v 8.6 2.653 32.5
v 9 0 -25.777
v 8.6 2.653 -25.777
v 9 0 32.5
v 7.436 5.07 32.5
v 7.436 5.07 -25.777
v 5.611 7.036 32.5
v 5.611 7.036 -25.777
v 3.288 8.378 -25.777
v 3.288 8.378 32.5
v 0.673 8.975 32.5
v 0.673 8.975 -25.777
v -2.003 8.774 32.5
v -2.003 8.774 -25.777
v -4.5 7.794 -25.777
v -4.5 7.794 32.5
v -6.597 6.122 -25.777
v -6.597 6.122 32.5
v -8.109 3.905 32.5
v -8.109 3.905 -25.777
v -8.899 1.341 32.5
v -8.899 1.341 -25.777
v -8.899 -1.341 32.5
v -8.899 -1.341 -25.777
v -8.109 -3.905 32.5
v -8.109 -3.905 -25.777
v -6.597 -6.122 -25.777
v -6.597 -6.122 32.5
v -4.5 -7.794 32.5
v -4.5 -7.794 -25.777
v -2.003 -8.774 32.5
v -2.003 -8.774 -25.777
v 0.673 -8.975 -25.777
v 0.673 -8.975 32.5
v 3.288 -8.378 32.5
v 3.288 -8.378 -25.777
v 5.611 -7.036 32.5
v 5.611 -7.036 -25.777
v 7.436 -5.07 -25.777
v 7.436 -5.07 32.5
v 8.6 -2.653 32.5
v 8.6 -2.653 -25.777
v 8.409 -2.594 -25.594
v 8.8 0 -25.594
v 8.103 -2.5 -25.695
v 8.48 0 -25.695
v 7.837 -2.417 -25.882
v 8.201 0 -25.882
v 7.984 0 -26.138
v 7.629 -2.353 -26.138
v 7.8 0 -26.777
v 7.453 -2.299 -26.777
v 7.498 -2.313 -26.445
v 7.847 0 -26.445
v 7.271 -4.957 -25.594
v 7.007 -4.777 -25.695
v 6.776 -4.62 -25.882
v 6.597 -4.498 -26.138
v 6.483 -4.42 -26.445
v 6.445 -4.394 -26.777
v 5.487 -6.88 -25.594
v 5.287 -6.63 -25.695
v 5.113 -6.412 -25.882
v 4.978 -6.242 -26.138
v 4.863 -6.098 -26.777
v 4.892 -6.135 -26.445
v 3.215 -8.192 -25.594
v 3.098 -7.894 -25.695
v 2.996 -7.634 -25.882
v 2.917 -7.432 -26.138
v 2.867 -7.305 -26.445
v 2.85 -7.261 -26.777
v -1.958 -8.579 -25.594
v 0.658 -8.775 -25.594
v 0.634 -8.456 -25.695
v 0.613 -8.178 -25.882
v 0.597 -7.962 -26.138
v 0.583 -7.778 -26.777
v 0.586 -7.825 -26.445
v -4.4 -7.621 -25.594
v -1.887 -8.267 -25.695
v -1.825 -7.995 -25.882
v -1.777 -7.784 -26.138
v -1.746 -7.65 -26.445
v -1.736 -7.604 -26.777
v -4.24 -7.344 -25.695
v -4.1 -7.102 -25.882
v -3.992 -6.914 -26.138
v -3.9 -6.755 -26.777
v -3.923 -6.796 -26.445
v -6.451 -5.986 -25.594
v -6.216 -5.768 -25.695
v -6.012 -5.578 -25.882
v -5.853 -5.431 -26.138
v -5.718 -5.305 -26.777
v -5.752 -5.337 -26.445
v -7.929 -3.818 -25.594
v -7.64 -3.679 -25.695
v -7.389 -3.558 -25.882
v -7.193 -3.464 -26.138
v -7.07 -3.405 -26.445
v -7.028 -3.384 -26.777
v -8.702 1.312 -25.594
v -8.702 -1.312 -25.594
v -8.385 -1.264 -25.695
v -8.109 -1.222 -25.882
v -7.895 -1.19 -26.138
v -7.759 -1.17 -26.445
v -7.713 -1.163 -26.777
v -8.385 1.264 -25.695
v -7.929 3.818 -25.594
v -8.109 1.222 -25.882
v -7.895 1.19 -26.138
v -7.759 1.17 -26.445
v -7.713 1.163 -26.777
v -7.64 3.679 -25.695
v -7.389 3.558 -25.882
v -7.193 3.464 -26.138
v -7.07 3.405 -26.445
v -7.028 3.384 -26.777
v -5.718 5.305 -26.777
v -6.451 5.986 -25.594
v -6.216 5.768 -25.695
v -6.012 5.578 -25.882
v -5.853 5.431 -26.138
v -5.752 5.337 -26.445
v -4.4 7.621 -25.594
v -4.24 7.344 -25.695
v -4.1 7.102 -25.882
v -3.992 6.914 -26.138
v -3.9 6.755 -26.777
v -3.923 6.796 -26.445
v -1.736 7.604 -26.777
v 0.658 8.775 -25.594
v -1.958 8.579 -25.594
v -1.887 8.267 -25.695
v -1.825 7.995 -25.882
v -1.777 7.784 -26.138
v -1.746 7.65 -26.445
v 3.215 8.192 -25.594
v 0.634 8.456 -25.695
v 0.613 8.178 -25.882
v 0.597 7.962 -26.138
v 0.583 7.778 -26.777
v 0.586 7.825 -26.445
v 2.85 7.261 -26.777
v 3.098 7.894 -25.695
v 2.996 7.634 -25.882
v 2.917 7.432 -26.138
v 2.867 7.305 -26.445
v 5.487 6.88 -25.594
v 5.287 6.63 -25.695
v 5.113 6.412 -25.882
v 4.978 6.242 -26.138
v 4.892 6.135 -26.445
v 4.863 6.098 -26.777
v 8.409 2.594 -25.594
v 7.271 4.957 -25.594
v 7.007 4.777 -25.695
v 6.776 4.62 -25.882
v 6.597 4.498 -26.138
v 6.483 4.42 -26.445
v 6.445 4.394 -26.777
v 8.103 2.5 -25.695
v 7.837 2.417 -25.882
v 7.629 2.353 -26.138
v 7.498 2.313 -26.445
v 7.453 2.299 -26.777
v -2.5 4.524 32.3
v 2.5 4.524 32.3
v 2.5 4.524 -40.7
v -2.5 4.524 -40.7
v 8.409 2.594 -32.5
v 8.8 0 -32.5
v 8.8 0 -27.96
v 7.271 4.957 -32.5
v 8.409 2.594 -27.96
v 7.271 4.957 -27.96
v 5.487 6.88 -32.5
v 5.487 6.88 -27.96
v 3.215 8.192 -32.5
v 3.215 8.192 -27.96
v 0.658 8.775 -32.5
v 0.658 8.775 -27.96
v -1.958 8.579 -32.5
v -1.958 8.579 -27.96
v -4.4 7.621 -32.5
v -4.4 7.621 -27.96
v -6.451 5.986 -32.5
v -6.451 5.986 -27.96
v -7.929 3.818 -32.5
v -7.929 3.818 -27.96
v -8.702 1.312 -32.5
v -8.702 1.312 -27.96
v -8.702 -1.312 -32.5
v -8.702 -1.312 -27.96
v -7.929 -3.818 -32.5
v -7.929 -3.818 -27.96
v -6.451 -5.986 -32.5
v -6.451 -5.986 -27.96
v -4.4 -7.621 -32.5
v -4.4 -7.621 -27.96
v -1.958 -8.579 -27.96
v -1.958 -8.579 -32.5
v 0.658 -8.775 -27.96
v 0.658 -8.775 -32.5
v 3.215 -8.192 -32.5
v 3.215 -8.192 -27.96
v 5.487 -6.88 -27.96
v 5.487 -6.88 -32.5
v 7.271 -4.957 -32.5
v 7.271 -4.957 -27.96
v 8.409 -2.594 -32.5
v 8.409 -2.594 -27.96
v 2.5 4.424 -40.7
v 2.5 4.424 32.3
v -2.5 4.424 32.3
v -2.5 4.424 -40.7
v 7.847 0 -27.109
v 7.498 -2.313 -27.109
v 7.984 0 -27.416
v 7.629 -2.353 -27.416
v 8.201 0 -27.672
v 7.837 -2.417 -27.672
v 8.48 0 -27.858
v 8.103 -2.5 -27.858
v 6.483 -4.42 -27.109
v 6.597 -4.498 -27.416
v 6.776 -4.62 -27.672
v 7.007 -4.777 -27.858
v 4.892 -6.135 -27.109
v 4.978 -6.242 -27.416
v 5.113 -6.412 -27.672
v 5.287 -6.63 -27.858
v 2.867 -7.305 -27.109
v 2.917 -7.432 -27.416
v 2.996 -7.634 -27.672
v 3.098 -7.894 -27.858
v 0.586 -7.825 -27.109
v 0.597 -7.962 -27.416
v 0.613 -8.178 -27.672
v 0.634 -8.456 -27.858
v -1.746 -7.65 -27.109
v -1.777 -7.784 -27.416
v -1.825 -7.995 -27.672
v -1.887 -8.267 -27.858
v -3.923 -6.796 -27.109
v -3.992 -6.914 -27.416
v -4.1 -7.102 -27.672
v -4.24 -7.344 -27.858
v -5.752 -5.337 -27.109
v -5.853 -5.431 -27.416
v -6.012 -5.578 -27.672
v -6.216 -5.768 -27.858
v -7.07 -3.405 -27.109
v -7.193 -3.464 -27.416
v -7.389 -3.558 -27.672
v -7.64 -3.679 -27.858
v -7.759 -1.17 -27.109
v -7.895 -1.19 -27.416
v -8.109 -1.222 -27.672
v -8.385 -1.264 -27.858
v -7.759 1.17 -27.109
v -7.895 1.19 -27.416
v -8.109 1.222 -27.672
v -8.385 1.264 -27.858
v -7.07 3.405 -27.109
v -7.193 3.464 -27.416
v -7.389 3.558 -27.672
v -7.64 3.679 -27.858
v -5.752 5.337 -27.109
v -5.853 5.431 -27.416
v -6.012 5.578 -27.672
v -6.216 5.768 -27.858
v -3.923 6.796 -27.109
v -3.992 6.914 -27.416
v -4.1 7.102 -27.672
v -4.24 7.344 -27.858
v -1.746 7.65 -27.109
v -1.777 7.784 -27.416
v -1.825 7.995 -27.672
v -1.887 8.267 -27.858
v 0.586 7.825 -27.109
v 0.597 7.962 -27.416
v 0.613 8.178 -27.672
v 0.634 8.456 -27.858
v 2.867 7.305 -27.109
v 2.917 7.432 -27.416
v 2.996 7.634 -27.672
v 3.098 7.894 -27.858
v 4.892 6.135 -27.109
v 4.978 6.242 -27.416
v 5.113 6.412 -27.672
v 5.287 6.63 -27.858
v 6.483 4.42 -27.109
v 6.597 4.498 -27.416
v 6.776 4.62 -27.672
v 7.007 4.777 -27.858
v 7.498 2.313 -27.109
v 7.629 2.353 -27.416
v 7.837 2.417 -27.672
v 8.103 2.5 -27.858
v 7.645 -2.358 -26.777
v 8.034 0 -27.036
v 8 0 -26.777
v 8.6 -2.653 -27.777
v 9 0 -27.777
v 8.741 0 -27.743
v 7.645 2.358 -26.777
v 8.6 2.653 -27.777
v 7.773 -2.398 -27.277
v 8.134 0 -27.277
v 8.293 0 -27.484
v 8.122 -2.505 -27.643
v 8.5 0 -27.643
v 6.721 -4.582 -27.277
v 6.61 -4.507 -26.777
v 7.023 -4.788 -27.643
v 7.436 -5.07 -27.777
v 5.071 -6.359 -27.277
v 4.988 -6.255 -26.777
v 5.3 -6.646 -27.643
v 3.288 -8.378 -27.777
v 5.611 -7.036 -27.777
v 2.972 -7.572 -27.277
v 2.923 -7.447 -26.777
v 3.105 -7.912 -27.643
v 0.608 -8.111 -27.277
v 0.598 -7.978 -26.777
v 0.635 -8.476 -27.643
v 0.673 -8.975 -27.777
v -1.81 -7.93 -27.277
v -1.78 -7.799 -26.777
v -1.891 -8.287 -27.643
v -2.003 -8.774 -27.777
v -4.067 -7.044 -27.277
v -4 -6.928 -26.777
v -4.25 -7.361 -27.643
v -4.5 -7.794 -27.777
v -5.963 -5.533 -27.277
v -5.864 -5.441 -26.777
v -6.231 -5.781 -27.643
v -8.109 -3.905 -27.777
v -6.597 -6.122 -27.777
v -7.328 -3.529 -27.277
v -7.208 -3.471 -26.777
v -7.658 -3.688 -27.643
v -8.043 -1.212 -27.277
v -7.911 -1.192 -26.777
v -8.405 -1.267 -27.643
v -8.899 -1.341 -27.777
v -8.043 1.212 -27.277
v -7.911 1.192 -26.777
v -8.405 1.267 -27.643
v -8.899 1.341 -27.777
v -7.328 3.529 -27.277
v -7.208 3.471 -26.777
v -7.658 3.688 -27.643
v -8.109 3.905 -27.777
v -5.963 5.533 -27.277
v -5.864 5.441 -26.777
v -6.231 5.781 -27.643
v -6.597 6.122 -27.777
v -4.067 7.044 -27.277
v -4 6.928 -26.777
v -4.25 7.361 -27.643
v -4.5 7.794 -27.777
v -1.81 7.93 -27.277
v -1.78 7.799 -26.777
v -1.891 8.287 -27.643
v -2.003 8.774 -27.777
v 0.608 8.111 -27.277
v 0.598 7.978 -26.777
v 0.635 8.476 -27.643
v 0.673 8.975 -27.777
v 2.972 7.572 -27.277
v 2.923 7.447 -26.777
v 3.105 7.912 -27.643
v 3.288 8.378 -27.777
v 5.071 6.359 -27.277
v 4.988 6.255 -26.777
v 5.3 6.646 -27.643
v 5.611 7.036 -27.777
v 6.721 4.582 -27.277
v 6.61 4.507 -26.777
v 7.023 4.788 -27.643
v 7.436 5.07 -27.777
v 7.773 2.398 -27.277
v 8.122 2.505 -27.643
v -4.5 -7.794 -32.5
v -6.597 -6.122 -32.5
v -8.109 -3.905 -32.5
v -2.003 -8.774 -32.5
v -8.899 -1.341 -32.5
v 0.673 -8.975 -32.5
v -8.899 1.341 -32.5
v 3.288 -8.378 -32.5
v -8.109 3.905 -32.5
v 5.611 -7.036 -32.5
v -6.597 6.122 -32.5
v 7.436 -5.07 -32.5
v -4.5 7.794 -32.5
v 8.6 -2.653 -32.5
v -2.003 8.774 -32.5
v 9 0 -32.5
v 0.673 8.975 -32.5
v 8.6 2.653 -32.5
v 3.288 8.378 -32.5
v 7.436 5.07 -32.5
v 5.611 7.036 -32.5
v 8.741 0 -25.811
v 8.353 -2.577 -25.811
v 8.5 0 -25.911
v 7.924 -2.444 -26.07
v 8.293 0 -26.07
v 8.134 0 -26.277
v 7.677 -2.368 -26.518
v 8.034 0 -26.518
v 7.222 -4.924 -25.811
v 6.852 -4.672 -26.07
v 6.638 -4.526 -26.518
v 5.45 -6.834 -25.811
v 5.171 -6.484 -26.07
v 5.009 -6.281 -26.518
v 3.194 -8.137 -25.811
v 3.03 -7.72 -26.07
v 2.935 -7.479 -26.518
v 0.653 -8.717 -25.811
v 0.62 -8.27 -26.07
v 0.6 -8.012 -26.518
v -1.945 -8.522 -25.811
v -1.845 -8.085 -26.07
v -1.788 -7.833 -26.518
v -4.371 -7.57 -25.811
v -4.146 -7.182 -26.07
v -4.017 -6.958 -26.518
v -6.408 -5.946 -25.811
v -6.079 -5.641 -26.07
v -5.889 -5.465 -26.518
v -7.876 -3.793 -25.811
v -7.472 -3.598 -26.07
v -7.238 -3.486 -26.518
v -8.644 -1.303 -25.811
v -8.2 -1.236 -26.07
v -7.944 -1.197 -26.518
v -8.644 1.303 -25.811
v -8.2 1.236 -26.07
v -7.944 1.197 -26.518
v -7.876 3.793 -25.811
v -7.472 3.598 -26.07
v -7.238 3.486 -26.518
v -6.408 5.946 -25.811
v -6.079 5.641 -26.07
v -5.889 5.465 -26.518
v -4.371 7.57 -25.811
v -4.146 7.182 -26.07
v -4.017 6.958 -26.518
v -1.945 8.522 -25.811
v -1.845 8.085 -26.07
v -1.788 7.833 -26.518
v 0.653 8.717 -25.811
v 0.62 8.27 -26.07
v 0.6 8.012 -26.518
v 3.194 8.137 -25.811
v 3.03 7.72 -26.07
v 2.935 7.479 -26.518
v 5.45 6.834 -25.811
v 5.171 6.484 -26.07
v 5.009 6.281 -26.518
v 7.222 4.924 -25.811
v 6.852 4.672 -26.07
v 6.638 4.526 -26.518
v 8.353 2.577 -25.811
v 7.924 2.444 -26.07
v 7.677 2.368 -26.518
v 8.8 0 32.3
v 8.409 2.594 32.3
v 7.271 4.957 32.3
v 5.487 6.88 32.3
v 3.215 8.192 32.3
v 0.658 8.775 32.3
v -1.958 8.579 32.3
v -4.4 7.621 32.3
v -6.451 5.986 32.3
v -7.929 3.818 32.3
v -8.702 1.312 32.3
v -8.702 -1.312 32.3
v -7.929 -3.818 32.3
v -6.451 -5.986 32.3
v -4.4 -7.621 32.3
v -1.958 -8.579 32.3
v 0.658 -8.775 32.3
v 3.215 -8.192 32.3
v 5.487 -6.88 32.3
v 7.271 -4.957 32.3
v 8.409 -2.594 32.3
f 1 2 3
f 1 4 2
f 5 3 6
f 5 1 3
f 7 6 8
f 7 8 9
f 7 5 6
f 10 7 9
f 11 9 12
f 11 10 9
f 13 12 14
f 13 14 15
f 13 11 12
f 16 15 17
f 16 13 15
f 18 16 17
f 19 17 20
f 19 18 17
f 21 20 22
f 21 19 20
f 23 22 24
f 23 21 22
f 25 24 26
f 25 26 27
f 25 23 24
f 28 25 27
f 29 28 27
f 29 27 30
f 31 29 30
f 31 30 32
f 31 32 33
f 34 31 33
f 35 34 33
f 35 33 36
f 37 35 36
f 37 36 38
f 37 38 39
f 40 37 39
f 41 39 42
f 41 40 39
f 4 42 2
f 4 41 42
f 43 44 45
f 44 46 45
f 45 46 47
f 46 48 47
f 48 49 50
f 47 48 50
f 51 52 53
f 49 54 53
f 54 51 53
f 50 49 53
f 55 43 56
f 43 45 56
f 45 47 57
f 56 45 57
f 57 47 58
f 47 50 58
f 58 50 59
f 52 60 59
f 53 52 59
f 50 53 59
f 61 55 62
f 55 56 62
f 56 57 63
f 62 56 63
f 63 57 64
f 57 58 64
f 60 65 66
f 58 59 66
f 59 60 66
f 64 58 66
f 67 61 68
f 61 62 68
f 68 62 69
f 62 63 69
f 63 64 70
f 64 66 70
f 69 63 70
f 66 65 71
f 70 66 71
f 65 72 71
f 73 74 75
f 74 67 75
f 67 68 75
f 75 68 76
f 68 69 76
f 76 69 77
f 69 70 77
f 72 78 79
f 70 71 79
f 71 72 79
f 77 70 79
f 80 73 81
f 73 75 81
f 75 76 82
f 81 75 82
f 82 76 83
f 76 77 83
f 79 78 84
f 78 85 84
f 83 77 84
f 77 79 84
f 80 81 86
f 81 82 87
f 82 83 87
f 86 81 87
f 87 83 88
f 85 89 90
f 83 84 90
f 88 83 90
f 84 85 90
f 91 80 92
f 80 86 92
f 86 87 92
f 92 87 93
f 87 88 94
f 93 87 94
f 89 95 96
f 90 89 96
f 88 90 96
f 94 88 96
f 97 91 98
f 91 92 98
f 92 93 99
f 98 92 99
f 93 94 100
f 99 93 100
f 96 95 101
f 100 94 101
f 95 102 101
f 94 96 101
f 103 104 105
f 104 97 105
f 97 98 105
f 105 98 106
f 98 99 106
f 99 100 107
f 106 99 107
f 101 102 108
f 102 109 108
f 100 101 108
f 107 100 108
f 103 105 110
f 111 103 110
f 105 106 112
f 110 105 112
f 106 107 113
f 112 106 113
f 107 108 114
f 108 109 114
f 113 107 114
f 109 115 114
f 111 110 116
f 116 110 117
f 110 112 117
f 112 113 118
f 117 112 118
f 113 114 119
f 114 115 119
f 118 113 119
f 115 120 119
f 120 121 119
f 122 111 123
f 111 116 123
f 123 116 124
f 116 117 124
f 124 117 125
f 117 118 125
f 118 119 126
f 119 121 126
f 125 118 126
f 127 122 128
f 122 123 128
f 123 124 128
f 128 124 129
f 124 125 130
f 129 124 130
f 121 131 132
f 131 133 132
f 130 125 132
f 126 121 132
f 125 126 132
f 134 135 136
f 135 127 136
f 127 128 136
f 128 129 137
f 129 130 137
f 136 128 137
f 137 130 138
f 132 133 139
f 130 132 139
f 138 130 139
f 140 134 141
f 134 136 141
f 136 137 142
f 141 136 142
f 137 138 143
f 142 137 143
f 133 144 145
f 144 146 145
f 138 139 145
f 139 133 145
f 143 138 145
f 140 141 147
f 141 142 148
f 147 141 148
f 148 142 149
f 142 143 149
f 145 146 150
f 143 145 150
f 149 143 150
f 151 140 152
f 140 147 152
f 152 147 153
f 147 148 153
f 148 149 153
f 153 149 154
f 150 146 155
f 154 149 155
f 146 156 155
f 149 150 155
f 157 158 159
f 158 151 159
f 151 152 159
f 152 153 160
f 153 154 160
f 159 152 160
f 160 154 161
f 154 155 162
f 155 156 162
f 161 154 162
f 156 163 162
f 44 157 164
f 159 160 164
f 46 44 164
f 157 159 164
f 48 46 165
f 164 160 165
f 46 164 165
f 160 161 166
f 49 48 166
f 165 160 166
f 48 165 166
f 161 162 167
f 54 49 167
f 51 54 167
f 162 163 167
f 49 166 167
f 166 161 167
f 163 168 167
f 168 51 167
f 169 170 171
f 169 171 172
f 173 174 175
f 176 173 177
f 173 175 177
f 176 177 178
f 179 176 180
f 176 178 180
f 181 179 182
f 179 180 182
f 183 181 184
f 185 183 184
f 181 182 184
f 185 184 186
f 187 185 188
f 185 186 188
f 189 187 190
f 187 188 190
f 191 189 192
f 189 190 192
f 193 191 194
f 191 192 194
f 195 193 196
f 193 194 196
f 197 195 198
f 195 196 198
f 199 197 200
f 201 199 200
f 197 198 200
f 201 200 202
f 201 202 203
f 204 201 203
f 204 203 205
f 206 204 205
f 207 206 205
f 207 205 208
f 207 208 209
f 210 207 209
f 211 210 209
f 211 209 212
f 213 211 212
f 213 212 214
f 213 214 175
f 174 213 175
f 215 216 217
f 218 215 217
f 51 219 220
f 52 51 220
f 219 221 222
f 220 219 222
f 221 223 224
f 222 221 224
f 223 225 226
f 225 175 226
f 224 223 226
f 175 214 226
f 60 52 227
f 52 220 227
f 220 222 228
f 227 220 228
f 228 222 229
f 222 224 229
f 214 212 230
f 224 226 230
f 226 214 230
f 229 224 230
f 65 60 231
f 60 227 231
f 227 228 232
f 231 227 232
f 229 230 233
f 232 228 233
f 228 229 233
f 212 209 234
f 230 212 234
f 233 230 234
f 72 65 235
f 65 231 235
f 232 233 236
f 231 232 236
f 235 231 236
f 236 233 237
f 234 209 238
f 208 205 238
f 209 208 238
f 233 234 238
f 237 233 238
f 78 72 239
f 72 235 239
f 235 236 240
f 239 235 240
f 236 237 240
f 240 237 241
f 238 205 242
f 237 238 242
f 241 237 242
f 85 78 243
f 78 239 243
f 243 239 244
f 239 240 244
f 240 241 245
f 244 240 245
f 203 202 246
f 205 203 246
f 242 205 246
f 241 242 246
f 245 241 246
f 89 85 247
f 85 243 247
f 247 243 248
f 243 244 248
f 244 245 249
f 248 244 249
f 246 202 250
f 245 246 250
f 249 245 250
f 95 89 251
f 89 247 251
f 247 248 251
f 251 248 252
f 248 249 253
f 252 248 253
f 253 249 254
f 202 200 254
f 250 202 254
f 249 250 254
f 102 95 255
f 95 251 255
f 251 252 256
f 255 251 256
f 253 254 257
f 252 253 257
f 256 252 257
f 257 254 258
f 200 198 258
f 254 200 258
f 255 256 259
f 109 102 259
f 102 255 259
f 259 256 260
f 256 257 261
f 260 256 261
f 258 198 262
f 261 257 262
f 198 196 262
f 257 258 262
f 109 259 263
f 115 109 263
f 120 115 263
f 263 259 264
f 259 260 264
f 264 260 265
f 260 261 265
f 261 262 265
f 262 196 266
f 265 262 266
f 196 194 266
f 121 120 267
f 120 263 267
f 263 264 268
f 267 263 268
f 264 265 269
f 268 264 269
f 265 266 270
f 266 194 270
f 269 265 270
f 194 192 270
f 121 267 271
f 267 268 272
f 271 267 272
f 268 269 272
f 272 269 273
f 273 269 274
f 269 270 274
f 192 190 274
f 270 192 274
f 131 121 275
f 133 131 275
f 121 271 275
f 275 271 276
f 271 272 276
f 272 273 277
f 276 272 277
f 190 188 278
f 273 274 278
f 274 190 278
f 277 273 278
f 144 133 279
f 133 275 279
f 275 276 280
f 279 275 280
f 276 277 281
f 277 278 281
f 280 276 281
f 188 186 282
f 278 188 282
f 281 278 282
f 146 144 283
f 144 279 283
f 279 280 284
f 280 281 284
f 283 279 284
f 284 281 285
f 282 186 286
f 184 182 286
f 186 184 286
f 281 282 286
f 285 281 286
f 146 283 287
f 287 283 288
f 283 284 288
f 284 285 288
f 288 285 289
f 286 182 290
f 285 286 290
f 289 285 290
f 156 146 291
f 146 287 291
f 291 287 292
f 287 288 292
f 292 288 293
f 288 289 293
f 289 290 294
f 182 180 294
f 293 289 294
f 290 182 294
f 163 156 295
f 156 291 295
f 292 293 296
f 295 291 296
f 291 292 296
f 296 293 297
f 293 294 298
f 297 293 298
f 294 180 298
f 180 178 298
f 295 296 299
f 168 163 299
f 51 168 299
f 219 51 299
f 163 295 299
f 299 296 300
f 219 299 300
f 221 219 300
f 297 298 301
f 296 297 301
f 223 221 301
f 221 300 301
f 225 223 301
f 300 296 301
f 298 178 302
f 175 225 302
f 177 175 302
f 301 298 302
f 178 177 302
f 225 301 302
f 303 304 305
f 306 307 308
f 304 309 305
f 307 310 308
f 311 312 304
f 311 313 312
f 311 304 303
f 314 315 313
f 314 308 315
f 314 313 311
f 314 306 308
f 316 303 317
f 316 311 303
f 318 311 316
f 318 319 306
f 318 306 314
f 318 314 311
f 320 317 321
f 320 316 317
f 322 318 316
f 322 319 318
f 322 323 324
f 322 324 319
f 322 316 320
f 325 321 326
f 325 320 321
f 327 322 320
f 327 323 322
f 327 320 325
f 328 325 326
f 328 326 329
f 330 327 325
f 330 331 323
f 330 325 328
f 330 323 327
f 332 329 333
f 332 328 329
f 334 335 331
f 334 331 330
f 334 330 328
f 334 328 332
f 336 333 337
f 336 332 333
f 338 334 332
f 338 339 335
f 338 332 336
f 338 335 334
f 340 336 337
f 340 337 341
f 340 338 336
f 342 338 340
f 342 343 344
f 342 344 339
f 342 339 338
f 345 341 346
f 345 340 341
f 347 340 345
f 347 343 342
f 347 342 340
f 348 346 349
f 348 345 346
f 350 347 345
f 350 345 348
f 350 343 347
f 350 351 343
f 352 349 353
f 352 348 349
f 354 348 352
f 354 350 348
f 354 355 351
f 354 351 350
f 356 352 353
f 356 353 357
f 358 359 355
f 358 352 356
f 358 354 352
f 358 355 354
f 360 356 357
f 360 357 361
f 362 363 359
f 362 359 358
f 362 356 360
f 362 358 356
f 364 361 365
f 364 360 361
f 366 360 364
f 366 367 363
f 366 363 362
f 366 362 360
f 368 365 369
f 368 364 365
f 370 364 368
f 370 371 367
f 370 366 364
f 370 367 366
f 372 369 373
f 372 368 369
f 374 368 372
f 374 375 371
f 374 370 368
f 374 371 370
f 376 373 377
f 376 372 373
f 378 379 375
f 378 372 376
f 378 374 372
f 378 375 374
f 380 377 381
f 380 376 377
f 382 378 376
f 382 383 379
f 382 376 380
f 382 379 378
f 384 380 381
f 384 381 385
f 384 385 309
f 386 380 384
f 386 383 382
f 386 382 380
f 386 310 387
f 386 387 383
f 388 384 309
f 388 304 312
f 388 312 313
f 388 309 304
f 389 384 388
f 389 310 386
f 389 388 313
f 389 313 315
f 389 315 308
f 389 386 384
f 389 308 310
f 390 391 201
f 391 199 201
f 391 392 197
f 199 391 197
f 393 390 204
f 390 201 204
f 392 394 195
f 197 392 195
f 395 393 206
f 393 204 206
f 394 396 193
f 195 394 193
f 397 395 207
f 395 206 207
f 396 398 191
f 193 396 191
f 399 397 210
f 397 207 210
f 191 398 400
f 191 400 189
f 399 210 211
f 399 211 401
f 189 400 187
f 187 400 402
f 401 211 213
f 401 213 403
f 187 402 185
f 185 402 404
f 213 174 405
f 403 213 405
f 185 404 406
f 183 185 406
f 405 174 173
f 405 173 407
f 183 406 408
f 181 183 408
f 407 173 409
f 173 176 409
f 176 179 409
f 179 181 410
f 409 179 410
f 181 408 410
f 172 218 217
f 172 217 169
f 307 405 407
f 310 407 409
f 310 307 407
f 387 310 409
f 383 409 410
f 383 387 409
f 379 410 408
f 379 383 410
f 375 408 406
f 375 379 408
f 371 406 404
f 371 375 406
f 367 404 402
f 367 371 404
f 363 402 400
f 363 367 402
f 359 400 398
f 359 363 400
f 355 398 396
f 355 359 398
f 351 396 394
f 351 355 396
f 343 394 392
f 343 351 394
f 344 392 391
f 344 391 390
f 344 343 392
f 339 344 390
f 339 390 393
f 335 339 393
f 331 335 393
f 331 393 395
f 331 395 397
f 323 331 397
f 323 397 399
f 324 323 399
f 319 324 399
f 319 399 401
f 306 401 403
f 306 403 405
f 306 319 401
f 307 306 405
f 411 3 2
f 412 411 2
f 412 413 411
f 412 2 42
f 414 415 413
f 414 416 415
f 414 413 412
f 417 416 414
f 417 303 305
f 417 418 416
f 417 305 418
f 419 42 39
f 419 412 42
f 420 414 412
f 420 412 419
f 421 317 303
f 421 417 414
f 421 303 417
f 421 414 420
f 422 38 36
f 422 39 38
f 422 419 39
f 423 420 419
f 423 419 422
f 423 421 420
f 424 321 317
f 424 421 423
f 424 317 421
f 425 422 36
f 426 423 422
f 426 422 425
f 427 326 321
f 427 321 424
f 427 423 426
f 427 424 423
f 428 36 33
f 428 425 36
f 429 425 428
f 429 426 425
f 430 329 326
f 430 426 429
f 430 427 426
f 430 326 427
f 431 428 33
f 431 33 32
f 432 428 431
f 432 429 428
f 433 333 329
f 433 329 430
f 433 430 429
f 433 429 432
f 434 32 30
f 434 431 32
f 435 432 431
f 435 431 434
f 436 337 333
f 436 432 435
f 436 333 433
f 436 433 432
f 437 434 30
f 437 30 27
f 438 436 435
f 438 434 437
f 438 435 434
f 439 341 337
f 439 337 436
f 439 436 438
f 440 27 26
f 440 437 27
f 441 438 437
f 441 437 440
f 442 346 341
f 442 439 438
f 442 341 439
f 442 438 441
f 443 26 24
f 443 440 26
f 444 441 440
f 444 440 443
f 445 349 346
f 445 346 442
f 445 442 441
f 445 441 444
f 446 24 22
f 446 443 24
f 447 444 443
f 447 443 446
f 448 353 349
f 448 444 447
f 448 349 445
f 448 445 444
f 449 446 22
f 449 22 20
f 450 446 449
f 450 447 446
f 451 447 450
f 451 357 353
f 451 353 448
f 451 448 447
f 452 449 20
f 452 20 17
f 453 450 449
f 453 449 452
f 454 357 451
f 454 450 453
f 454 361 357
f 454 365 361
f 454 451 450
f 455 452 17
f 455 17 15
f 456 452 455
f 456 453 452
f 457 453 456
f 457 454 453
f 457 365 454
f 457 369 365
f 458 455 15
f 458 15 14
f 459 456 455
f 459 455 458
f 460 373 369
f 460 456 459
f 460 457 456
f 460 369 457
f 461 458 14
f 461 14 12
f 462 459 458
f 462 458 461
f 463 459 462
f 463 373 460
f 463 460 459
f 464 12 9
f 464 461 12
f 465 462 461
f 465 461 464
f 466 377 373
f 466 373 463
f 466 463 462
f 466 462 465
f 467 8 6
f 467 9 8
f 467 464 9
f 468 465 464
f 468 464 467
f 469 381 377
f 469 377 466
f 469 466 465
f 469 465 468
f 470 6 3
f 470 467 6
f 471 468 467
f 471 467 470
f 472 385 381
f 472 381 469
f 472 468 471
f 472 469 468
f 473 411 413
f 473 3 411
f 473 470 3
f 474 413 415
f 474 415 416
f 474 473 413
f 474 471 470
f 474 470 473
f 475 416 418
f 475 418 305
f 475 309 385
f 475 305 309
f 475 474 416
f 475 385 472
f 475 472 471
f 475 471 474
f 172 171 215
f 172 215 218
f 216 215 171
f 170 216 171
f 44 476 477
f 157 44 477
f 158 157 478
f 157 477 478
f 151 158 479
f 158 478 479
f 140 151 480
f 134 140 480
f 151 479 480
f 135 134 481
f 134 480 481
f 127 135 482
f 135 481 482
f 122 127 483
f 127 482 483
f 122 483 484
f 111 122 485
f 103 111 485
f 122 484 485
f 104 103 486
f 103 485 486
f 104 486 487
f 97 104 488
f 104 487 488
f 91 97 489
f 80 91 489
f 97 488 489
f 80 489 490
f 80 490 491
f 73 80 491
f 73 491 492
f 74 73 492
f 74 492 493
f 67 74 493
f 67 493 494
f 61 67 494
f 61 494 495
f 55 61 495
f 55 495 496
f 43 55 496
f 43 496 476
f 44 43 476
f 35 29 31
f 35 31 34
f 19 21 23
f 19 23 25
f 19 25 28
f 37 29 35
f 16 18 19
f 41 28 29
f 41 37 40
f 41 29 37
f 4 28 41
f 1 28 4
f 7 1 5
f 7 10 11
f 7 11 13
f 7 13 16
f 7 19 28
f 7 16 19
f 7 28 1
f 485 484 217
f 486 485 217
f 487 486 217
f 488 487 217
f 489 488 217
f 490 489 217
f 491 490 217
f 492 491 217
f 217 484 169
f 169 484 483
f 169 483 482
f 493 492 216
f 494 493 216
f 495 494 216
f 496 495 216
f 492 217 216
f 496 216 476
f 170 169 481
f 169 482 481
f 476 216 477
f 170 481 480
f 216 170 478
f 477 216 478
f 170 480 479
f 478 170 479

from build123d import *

# Parameters (mm, degrees)
SKETCH_2_R      = 9
EXTRUDE_1_DEPTH = 32.5
SKETCH_3_R      = 1
SHELL_1_T       = -0.2
SKETCH_4_W      = 5
SKETCH_4_H      = 0.1
EXTRUDE_2_DEPTH = 73


with BuildPart() as part:
    # 草图2 → 凸台-拉伸1 (new, symmetric)
    with BuildSketch(Plane.XY):
        Circle(SKETCH_2_R)
    extrude(amount=EXTRUDE_1_DEPTH, both=True)

    # 草图3 → 切除-旋转1 (revolve, cut)
    with BuildSketch(Plane(origin=(0, 0, 0), x_dir=(1, 0, 0), z_dir=(0, 1, 0)), mode=Mode.PRIVATE) as cut_revolve_1_sk:
        with Locations((-9, 26.776971268)):
            Circle(SKETCH_3_R)
    revolve(cut_revolve_1_sk.sketch.rotate(Axis((0, 0, 0), (0, 0, -1)), 180), axis=Axis((0, 0, 0), (0, 0, -1)), mode=Mode.SUBTRACT)

    # 抽壳1
    shell_1_openings = [part.faces().sort_by_distance(p)[0] for p in [
        (0, 0, -32.5),
    ]]
    offset(amount=SHELL_1_T, openings=shell_1_openings, kind=Kind.INTERSECTION)

    # 草图4 → 凸台-拉伸2 (add)
    with BuildSketch(Plane(origin=(0, 0, 32.3), x_dir=(-1, 0, 0), z_dir=(0, 0, -1))):
        with Locations((0, 4.473785882)):
            Rectangle(SKETCH_4_W, SKETCH_4_H)
    extrude(amount=EXTRUDE_2_DEPTH)


solid = part.part
